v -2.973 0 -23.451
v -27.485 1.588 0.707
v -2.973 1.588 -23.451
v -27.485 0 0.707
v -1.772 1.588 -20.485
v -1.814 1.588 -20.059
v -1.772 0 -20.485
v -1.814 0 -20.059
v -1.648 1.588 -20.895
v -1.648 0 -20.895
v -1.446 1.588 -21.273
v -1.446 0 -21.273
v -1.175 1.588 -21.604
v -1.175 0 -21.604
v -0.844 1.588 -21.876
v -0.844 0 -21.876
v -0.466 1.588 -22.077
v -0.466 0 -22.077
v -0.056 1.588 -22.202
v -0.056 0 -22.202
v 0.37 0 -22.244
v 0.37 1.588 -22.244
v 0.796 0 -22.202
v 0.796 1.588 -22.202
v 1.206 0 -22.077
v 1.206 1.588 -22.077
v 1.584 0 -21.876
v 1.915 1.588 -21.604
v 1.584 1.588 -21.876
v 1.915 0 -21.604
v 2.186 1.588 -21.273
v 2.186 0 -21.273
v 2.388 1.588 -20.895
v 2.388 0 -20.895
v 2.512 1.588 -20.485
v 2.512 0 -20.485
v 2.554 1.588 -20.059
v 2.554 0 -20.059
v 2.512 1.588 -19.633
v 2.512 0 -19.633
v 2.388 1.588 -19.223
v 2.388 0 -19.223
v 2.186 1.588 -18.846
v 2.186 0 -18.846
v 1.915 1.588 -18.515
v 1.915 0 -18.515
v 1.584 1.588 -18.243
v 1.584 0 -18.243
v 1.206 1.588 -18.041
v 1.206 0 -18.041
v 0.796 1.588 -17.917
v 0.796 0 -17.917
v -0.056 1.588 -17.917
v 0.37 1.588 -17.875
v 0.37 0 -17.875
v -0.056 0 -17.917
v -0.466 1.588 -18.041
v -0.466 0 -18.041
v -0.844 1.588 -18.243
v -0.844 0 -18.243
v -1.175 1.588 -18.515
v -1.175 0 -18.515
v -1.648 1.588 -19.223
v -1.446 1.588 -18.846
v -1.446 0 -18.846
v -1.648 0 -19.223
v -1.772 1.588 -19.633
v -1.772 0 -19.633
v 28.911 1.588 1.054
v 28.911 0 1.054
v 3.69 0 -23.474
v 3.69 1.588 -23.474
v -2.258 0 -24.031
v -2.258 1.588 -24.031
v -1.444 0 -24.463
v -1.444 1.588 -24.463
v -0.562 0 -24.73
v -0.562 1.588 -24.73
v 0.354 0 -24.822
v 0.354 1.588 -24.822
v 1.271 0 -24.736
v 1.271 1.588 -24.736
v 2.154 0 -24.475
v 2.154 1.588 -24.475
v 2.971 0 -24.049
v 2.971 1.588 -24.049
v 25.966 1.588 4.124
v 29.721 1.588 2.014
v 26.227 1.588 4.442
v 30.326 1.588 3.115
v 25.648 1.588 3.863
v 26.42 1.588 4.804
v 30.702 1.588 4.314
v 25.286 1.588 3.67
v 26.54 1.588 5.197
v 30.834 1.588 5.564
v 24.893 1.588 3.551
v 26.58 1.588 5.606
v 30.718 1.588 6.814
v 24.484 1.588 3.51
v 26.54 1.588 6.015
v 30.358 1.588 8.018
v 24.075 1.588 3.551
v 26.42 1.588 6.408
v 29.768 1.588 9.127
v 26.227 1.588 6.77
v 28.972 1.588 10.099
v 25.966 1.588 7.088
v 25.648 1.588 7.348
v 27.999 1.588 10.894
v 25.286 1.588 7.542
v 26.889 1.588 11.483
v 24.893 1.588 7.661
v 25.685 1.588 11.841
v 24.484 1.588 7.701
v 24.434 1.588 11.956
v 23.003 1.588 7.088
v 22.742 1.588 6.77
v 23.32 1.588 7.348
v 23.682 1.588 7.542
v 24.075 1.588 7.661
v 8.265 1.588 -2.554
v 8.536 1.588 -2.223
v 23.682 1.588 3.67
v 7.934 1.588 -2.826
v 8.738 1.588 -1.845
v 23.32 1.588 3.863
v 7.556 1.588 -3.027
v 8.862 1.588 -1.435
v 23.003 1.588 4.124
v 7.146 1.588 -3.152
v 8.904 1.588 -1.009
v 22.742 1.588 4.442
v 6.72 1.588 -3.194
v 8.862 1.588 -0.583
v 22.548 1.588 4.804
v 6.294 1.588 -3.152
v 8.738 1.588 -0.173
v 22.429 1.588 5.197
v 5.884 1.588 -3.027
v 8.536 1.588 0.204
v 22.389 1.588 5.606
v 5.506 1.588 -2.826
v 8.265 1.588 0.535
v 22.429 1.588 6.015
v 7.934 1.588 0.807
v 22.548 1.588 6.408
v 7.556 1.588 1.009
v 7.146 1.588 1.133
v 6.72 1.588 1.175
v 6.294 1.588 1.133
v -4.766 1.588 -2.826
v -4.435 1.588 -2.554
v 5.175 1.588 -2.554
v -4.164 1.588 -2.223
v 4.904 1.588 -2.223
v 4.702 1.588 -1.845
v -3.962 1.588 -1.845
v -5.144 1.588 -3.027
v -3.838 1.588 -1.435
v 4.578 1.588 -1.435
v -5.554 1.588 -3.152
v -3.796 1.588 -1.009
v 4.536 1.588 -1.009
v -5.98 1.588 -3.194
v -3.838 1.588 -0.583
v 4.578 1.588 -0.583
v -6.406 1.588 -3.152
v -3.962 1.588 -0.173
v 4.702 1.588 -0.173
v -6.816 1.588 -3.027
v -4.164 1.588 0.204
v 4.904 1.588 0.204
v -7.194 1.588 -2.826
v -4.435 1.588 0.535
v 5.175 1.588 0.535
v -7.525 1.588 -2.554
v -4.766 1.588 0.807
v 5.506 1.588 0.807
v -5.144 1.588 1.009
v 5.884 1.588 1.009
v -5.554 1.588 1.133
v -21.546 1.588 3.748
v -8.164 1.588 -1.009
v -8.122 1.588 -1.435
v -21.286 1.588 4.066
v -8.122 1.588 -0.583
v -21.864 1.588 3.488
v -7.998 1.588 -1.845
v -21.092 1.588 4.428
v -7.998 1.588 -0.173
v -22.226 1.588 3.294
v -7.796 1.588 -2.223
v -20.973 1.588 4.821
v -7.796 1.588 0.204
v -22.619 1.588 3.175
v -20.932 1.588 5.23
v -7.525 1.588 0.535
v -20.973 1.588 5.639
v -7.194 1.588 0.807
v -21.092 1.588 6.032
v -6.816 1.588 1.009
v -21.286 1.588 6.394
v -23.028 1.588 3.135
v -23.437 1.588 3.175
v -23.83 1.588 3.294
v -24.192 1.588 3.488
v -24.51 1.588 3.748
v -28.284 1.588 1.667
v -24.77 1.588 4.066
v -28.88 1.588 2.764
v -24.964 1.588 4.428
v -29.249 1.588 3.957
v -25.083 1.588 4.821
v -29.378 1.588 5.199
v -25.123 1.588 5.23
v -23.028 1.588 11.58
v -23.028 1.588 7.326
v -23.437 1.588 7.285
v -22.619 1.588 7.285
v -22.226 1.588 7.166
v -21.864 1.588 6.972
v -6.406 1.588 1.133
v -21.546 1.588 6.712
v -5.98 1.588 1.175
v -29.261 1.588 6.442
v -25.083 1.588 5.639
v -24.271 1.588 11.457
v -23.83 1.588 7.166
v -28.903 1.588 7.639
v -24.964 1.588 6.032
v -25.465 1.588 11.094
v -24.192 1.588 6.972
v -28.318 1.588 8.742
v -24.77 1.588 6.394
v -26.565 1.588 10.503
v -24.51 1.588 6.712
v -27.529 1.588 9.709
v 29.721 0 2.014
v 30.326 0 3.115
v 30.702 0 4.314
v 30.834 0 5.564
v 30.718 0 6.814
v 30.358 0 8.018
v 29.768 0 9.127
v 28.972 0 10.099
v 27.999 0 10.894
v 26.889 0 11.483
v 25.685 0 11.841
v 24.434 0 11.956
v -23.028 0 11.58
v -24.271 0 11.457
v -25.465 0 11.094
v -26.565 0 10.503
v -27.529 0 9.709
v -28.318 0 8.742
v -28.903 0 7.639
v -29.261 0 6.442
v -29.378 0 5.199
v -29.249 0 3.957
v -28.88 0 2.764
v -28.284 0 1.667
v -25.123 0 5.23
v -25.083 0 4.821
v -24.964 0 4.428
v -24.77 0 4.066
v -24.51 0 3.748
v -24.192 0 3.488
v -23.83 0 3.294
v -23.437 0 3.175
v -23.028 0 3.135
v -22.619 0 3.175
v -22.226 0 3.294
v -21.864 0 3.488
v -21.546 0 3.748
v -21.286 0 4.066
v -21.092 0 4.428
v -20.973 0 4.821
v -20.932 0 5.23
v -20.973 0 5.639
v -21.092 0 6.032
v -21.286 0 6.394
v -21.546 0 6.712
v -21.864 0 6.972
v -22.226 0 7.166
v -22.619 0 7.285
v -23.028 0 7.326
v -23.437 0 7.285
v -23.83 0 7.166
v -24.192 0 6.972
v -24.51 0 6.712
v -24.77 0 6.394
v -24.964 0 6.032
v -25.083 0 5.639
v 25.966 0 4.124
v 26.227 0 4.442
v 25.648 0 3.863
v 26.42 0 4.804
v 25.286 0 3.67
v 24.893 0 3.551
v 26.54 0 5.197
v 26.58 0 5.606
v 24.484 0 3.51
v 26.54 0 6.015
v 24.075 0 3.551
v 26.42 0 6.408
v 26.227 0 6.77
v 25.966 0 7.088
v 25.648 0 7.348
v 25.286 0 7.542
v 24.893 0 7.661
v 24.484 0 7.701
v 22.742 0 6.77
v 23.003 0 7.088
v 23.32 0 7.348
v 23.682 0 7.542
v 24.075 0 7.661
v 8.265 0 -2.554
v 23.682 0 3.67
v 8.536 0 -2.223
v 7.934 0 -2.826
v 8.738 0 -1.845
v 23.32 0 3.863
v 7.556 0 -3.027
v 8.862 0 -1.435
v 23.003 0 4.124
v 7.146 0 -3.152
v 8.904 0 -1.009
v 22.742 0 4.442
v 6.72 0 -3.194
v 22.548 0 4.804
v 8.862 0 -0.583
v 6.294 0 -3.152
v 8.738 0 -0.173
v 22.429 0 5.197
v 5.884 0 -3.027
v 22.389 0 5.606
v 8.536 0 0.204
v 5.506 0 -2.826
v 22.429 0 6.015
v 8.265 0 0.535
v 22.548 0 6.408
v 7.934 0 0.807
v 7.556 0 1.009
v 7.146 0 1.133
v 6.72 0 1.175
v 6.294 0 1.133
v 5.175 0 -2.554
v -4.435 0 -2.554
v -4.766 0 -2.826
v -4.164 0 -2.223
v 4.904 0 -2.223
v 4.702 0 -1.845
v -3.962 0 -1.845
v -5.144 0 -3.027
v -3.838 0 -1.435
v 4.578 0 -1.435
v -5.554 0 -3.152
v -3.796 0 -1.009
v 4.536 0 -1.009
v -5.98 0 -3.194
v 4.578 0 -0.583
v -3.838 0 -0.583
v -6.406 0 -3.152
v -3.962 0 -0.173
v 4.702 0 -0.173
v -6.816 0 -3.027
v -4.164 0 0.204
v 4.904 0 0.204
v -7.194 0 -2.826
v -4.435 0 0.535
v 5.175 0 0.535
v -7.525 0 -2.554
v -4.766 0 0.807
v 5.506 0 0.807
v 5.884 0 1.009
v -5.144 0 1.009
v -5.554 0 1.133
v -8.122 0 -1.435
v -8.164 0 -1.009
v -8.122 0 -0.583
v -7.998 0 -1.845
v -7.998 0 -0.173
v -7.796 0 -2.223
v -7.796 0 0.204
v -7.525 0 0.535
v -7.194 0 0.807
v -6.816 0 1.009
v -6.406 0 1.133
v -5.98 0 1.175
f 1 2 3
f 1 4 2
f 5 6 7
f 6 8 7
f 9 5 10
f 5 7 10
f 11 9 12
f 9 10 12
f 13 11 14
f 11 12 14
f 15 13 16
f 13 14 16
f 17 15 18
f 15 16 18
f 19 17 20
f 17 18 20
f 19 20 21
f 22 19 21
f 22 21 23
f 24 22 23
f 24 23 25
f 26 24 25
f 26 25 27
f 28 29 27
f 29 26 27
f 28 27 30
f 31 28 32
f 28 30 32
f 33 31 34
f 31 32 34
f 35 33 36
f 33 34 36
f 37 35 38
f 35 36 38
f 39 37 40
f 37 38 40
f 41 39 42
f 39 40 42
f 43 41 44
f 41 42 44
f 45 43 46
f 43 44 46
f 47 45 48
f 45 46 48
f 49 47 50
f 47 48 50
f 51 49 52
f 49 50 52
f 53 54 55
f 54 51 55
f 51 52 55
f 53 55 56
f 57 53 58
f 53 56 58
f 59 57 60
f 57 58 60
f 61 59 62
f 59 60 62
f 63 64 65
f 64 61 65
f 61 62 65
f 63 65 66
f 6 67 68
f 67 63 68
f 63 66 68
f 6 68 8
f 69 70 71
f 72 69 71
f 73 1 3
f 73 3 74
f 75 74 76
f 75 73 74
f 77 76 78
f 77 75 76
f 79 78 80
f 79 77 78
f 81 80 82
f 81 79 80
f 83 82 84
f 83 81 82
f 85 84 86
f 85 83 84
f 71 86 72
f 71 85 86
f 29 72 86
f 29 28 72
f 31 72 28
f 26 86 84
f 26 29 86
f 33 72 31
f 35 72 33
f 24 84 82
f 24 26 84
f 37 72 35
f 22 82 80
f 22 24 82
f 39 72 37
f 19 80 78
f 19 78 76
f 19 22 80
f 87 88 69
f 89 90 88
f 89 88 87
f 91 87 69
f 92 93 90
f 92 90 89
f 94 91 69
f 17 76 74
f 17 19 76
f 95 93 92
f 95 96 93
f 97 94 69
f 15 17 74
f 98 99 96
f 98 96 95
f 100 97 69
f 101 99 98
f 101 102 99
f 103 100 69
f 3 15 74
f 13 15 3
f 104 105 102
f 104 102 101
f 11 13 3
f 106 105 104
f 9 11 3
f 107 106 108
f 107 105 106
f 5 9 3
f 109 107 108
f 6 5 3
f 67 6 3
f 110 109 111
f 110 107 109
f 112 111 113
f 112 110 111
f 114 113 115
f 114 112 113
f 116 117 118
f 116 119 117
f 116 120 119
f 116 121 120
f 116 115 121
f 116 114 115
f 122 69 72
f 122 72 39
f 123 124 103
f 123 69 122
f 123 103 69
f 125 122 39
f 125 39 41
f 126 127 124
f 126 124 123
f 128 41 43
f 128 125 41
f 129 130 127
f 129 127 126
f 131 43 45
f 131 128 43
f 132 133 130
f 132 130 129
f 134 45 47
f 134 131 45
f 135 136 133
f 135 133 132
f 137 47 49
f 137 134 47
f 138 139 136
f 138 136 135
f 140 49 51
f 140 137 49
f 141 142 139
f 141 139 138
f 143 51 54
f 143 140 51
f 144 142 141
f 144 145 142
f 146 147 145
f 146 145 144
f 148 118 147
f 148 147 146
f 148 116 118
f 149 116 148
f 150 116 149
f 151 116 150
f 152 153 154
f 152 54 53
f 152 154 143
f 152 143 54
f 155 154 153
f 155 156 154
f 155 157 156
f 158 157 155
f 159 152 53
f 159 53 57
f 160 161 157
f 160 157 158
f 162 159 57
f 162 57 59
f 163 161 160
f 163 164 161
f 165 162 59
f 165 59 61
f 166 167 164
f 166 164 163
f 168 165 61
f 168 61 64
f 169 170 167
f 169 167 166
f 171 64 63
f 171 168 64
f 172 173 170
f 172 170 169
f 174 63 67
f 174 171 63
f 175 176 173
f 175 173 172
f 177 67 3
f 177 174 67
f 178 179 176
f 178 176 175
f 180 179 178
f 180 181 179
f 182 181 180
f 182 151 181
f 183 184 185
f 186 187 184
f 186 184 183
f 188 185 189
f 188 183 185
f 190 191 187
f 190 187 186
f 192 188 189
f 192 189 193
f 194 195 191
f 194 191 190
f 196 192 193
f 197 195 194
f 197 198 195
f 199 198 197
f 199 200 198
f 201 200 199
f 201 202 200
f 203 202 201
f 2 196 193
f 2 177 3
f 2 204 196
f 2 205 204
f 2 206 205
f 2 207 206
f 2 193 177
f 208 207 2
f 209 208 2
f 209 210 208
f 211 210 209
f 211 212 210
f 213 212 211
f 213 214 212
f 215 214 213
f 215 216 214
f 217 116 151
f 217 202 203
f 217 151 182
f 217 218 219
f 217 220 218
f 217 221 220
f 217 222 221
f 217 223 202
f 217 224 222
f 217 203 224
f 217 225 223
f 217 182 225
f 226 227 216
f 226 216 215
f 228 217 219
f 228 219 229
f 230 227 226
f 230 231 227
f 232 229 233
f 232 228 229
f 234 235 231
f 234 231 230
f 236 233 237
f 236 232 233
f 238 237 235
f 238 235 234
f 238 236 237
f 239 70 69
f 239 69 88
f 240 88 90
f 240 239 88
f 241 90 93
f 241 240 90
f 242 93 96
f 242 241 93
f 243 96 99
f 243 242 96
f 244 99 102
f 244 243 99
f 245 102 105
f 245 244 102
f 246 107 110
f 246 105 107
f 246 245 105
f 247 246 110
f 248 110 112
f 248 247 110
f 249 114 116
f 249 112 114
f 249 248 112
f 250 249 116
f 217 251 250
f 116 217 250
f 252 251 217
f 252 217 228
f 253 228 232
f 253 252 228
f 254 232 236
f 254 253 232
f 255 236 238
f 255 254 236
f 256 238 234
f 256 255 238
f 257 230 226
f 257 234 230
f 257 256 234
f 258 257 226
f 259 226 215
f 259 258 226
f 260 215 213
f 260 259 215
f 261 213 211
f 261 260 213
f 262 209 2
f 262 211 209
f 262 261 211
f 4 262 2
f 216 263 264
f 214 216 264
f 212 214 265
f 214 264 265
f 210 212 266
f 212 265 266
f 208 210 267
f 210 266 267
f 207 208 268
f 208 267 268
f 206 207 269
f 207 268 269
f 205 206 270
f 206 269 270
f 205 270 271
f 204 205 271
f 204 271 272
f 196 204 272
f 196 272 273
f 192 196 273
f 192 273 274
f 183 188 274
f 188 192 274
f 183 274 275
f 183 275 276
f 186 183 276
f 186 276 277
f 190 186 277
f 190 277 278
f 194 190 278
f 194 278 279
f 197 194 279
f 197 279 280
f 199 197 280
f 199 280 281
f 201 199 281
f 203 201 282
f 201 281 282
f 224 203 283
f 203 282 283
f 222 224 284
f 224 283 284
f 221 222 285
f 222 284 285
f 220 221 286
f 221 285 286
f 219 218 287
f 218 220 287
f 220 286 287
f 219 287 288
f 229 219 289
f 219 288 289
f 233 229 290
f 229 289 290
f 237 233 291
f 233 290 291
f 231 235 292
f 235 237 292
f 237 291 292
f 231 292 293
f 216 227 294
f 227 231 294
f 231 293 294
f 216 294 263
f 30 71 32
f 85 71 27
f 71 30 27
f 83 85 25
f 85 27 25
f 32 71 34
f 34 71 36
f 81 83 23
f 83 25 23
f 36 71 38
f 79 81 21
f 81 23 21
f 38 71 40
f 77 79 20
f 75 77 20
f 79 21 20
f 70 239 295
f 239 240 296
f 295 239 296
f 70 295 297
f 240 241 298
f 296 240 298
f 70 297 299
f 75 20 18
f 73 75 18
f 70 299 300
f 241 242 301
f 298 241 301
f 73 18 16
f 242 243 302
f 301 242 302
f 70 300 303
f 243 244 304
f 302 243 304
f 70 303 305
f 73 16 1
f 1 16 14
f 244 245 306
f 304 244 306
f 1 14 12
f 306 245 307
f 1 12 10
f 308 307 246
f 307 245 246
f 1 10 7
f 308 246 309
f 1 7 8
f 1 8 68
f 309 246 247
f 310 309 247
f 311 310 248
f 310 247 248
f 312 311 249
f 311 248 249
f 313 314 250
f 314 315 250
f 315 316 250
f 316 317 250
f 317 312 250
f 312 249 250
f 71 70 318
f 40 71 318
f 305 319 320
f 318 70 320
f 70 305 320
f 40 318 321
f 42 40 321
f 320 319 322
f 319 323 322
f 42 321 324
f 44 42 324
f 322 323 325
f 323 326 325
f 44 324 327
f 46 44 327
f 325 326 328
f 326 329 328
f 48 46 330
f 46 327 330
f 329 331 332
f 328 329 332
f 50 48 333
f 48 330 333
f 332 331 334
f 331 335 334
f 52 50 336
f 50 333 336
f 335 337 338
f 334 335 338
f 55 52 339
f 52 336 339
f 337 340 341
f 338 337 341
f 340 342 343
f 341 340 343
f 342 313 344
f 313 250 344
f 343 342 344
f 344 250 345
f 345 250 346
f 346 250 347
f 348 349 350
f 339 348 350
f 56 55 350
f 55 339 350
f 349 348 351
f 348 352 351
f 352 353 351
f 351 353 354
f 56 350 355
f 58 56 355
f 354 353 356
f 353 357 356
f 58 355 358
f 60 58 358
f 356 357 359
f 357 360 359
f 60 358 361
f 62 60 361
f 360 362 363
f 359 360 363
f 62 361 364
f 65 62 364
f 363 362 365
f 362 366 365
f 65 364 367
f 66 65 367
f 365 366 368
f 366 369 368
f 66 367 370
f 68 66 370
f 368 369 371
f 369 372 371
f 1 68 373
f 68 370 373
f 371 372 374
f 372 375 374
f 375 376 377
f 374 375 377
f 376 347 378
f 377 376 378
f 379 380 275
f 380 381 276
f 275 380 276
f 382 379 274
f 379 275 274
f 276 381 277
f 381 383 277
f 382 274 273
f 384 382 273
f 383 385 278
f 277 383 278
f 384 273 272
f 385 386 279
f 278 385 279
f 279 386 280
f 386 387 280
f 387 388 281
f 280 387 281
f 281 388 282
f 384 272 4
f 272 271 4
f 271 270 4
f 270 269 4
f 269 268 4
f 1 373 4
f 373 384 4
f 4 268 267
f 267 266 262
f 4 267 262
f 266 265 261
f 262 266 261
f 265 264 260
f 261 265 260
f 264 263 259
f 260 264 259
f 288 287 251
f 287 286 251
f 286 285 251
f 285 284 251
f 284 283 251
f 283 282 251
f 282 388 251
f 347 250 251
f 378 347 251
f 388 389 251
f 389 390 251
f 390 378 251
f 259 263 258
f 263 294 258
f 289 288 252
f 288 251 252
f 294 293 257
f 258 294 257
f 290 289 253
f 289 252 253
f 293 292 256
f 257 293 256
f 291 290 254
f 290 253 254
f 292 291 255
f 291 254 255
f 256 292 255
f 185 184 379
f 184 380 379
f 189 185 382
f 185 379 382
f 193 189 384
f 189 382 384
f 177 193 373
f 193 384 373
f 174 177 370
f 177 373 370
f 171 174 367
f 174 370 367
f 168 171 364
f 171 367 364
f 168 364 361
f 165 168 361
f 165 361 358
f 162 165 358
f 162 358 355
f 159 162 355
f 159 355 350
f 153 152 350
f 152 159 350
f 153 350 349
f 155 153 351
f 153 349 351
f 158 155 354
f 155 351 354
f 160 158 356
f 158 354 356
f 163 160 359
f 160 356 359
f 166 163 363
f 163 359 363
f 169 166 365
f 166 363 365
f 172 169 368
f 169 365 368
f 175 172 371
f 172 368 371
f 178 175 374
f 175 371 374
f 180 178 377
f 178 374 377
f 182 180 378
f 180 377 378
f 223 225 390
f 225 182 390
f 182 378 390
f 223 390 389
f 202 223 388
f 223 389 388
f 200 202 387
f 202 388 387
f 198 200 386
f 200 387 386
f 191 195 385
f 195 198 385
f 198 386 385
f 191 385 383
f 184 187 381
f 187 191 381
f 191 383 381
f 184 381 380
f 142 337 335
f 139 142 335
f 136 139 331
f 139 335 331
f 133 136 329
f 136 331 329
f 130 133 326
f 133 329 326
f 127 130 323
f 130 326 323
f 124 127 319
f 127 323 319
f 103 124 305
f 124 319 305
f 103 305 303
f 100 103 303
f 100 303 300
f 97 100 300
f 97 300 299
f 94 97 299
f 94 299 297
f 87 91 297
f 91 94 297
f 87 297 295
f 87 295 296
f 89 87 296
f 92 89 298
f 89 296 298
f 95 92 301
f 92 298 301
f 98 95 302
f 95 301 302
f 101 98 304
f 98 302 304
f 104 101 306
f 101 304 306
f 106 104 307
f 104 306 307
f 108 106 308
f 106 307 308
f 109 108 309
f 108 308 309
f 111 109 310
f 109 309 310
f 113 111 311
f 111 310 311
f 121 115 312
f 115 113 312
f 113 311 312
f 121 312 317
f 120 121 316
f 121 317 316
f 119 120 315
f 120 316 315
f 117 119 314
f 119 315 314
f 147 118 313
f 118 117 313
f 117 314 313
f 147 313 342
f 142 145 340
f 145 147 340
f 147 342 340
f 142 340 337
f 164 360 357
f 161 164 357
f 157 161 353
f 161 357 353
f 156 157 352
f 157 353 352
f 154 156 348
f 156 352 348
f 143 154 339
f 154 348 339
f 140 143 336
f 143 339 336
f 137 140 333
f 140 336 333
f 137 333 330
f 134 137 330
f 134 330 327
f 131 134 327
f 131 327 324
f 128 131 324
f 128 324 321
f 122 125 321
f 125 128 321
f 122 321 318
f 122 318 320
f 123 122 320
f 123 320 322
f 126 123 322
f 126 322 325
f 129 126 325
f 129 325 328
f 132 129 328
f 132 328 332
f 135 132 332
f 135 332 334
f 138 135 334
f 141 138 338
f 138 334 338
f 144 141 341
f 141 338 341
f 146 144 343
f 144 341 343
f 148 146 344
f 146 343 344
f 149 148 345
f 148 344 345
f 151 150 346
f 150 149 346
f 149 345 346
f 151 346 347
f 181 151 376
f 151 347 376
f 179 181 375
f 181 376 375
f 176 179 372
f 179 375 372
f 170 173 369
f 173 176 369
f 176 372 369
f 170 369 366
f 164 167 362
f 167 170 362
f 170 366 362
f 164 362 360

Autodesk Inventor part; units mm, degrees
ref_plane "YZ Plane" through (0, 0, 0) normal (1, 0, 0) x (0, 1, 0)
ref_plane "XZ Plane" through (0, 0, 0) normal (0, 1, 0) x (-1, 0, 0)
ref_plane "XY Plane" through (0, 0, 0) normal (0, 0, 1) x (1, 0, 0)
sketch "Sketch1" plane through (0, 0, 0) normal (0, 1, 0) x (-1, 0, 0)
  circle A0 centre (5.98, -1.0093) radius 2.1844
  circle A1 centre (-6.72, -1.0093) radius 2.1844
  arc A2 (25.9781, -0.3931) -> (23.0279, 11.58) centre (23.0279, 5.23) ccw
  arc A3 (-24.4341, 11.9556) -> (-27.4345, -0.0172) centre (-24.4843, 5.6058) ccw
  circle A4 centre (23.0279, 5.23) radius 2.0955
  circle A5 centre (-24.4843, 5.6058) radius 2.0955
  line L0 (23.0279, 11.58) -> (-24.4341, 11.9556)
  circle A6 centre (-0.37, -20.0593) radius 2.1844
  arc A7 (-3.6903, -23.4735) -> (2.973, -23.4513) centre (-0.37, -20.0593) ccw
  line L1 (27.4853, 0.7073) -> (2.973, -23.4513)
  line L2 (-28.9114, 1.0535) -> (-3.6903, -23.4735)
  point P0 (0, 0)
  dimension "d0" = 12.7
  dimension "d1" = 12.7
  dimension "d2" = 4.191
  dimension "d3" = 4.191
  dimension "d4" = 9.525
  dimension "d7" = 6.2393
  dimension "d8" = 17.0479
extrude "Extrusion1" add sketch "Sketch1" along normal blind 1.5875
equation "\"BendRadius\" = Thickness"
equation "\"BendReliefWidth\" = Thickness"
equation "\"BendReliefDepth\" = 0.5 * Thickness"
equation "\"CornerReliefSize\" = 4 * Thickness"
equation "\"MinimumRemnant\" = 2 * Thickness"
equation "\"TransitionRadius\" = BendRadius"
equation "\"JacobiRadiusSize\" = BendRadius"
equation "\"GapSize\" = Thickness"
equation "\"Thickness\" = 1.5875"
properties part number "MOGO Clamp Gusset" material "Acetal Resin, White"
